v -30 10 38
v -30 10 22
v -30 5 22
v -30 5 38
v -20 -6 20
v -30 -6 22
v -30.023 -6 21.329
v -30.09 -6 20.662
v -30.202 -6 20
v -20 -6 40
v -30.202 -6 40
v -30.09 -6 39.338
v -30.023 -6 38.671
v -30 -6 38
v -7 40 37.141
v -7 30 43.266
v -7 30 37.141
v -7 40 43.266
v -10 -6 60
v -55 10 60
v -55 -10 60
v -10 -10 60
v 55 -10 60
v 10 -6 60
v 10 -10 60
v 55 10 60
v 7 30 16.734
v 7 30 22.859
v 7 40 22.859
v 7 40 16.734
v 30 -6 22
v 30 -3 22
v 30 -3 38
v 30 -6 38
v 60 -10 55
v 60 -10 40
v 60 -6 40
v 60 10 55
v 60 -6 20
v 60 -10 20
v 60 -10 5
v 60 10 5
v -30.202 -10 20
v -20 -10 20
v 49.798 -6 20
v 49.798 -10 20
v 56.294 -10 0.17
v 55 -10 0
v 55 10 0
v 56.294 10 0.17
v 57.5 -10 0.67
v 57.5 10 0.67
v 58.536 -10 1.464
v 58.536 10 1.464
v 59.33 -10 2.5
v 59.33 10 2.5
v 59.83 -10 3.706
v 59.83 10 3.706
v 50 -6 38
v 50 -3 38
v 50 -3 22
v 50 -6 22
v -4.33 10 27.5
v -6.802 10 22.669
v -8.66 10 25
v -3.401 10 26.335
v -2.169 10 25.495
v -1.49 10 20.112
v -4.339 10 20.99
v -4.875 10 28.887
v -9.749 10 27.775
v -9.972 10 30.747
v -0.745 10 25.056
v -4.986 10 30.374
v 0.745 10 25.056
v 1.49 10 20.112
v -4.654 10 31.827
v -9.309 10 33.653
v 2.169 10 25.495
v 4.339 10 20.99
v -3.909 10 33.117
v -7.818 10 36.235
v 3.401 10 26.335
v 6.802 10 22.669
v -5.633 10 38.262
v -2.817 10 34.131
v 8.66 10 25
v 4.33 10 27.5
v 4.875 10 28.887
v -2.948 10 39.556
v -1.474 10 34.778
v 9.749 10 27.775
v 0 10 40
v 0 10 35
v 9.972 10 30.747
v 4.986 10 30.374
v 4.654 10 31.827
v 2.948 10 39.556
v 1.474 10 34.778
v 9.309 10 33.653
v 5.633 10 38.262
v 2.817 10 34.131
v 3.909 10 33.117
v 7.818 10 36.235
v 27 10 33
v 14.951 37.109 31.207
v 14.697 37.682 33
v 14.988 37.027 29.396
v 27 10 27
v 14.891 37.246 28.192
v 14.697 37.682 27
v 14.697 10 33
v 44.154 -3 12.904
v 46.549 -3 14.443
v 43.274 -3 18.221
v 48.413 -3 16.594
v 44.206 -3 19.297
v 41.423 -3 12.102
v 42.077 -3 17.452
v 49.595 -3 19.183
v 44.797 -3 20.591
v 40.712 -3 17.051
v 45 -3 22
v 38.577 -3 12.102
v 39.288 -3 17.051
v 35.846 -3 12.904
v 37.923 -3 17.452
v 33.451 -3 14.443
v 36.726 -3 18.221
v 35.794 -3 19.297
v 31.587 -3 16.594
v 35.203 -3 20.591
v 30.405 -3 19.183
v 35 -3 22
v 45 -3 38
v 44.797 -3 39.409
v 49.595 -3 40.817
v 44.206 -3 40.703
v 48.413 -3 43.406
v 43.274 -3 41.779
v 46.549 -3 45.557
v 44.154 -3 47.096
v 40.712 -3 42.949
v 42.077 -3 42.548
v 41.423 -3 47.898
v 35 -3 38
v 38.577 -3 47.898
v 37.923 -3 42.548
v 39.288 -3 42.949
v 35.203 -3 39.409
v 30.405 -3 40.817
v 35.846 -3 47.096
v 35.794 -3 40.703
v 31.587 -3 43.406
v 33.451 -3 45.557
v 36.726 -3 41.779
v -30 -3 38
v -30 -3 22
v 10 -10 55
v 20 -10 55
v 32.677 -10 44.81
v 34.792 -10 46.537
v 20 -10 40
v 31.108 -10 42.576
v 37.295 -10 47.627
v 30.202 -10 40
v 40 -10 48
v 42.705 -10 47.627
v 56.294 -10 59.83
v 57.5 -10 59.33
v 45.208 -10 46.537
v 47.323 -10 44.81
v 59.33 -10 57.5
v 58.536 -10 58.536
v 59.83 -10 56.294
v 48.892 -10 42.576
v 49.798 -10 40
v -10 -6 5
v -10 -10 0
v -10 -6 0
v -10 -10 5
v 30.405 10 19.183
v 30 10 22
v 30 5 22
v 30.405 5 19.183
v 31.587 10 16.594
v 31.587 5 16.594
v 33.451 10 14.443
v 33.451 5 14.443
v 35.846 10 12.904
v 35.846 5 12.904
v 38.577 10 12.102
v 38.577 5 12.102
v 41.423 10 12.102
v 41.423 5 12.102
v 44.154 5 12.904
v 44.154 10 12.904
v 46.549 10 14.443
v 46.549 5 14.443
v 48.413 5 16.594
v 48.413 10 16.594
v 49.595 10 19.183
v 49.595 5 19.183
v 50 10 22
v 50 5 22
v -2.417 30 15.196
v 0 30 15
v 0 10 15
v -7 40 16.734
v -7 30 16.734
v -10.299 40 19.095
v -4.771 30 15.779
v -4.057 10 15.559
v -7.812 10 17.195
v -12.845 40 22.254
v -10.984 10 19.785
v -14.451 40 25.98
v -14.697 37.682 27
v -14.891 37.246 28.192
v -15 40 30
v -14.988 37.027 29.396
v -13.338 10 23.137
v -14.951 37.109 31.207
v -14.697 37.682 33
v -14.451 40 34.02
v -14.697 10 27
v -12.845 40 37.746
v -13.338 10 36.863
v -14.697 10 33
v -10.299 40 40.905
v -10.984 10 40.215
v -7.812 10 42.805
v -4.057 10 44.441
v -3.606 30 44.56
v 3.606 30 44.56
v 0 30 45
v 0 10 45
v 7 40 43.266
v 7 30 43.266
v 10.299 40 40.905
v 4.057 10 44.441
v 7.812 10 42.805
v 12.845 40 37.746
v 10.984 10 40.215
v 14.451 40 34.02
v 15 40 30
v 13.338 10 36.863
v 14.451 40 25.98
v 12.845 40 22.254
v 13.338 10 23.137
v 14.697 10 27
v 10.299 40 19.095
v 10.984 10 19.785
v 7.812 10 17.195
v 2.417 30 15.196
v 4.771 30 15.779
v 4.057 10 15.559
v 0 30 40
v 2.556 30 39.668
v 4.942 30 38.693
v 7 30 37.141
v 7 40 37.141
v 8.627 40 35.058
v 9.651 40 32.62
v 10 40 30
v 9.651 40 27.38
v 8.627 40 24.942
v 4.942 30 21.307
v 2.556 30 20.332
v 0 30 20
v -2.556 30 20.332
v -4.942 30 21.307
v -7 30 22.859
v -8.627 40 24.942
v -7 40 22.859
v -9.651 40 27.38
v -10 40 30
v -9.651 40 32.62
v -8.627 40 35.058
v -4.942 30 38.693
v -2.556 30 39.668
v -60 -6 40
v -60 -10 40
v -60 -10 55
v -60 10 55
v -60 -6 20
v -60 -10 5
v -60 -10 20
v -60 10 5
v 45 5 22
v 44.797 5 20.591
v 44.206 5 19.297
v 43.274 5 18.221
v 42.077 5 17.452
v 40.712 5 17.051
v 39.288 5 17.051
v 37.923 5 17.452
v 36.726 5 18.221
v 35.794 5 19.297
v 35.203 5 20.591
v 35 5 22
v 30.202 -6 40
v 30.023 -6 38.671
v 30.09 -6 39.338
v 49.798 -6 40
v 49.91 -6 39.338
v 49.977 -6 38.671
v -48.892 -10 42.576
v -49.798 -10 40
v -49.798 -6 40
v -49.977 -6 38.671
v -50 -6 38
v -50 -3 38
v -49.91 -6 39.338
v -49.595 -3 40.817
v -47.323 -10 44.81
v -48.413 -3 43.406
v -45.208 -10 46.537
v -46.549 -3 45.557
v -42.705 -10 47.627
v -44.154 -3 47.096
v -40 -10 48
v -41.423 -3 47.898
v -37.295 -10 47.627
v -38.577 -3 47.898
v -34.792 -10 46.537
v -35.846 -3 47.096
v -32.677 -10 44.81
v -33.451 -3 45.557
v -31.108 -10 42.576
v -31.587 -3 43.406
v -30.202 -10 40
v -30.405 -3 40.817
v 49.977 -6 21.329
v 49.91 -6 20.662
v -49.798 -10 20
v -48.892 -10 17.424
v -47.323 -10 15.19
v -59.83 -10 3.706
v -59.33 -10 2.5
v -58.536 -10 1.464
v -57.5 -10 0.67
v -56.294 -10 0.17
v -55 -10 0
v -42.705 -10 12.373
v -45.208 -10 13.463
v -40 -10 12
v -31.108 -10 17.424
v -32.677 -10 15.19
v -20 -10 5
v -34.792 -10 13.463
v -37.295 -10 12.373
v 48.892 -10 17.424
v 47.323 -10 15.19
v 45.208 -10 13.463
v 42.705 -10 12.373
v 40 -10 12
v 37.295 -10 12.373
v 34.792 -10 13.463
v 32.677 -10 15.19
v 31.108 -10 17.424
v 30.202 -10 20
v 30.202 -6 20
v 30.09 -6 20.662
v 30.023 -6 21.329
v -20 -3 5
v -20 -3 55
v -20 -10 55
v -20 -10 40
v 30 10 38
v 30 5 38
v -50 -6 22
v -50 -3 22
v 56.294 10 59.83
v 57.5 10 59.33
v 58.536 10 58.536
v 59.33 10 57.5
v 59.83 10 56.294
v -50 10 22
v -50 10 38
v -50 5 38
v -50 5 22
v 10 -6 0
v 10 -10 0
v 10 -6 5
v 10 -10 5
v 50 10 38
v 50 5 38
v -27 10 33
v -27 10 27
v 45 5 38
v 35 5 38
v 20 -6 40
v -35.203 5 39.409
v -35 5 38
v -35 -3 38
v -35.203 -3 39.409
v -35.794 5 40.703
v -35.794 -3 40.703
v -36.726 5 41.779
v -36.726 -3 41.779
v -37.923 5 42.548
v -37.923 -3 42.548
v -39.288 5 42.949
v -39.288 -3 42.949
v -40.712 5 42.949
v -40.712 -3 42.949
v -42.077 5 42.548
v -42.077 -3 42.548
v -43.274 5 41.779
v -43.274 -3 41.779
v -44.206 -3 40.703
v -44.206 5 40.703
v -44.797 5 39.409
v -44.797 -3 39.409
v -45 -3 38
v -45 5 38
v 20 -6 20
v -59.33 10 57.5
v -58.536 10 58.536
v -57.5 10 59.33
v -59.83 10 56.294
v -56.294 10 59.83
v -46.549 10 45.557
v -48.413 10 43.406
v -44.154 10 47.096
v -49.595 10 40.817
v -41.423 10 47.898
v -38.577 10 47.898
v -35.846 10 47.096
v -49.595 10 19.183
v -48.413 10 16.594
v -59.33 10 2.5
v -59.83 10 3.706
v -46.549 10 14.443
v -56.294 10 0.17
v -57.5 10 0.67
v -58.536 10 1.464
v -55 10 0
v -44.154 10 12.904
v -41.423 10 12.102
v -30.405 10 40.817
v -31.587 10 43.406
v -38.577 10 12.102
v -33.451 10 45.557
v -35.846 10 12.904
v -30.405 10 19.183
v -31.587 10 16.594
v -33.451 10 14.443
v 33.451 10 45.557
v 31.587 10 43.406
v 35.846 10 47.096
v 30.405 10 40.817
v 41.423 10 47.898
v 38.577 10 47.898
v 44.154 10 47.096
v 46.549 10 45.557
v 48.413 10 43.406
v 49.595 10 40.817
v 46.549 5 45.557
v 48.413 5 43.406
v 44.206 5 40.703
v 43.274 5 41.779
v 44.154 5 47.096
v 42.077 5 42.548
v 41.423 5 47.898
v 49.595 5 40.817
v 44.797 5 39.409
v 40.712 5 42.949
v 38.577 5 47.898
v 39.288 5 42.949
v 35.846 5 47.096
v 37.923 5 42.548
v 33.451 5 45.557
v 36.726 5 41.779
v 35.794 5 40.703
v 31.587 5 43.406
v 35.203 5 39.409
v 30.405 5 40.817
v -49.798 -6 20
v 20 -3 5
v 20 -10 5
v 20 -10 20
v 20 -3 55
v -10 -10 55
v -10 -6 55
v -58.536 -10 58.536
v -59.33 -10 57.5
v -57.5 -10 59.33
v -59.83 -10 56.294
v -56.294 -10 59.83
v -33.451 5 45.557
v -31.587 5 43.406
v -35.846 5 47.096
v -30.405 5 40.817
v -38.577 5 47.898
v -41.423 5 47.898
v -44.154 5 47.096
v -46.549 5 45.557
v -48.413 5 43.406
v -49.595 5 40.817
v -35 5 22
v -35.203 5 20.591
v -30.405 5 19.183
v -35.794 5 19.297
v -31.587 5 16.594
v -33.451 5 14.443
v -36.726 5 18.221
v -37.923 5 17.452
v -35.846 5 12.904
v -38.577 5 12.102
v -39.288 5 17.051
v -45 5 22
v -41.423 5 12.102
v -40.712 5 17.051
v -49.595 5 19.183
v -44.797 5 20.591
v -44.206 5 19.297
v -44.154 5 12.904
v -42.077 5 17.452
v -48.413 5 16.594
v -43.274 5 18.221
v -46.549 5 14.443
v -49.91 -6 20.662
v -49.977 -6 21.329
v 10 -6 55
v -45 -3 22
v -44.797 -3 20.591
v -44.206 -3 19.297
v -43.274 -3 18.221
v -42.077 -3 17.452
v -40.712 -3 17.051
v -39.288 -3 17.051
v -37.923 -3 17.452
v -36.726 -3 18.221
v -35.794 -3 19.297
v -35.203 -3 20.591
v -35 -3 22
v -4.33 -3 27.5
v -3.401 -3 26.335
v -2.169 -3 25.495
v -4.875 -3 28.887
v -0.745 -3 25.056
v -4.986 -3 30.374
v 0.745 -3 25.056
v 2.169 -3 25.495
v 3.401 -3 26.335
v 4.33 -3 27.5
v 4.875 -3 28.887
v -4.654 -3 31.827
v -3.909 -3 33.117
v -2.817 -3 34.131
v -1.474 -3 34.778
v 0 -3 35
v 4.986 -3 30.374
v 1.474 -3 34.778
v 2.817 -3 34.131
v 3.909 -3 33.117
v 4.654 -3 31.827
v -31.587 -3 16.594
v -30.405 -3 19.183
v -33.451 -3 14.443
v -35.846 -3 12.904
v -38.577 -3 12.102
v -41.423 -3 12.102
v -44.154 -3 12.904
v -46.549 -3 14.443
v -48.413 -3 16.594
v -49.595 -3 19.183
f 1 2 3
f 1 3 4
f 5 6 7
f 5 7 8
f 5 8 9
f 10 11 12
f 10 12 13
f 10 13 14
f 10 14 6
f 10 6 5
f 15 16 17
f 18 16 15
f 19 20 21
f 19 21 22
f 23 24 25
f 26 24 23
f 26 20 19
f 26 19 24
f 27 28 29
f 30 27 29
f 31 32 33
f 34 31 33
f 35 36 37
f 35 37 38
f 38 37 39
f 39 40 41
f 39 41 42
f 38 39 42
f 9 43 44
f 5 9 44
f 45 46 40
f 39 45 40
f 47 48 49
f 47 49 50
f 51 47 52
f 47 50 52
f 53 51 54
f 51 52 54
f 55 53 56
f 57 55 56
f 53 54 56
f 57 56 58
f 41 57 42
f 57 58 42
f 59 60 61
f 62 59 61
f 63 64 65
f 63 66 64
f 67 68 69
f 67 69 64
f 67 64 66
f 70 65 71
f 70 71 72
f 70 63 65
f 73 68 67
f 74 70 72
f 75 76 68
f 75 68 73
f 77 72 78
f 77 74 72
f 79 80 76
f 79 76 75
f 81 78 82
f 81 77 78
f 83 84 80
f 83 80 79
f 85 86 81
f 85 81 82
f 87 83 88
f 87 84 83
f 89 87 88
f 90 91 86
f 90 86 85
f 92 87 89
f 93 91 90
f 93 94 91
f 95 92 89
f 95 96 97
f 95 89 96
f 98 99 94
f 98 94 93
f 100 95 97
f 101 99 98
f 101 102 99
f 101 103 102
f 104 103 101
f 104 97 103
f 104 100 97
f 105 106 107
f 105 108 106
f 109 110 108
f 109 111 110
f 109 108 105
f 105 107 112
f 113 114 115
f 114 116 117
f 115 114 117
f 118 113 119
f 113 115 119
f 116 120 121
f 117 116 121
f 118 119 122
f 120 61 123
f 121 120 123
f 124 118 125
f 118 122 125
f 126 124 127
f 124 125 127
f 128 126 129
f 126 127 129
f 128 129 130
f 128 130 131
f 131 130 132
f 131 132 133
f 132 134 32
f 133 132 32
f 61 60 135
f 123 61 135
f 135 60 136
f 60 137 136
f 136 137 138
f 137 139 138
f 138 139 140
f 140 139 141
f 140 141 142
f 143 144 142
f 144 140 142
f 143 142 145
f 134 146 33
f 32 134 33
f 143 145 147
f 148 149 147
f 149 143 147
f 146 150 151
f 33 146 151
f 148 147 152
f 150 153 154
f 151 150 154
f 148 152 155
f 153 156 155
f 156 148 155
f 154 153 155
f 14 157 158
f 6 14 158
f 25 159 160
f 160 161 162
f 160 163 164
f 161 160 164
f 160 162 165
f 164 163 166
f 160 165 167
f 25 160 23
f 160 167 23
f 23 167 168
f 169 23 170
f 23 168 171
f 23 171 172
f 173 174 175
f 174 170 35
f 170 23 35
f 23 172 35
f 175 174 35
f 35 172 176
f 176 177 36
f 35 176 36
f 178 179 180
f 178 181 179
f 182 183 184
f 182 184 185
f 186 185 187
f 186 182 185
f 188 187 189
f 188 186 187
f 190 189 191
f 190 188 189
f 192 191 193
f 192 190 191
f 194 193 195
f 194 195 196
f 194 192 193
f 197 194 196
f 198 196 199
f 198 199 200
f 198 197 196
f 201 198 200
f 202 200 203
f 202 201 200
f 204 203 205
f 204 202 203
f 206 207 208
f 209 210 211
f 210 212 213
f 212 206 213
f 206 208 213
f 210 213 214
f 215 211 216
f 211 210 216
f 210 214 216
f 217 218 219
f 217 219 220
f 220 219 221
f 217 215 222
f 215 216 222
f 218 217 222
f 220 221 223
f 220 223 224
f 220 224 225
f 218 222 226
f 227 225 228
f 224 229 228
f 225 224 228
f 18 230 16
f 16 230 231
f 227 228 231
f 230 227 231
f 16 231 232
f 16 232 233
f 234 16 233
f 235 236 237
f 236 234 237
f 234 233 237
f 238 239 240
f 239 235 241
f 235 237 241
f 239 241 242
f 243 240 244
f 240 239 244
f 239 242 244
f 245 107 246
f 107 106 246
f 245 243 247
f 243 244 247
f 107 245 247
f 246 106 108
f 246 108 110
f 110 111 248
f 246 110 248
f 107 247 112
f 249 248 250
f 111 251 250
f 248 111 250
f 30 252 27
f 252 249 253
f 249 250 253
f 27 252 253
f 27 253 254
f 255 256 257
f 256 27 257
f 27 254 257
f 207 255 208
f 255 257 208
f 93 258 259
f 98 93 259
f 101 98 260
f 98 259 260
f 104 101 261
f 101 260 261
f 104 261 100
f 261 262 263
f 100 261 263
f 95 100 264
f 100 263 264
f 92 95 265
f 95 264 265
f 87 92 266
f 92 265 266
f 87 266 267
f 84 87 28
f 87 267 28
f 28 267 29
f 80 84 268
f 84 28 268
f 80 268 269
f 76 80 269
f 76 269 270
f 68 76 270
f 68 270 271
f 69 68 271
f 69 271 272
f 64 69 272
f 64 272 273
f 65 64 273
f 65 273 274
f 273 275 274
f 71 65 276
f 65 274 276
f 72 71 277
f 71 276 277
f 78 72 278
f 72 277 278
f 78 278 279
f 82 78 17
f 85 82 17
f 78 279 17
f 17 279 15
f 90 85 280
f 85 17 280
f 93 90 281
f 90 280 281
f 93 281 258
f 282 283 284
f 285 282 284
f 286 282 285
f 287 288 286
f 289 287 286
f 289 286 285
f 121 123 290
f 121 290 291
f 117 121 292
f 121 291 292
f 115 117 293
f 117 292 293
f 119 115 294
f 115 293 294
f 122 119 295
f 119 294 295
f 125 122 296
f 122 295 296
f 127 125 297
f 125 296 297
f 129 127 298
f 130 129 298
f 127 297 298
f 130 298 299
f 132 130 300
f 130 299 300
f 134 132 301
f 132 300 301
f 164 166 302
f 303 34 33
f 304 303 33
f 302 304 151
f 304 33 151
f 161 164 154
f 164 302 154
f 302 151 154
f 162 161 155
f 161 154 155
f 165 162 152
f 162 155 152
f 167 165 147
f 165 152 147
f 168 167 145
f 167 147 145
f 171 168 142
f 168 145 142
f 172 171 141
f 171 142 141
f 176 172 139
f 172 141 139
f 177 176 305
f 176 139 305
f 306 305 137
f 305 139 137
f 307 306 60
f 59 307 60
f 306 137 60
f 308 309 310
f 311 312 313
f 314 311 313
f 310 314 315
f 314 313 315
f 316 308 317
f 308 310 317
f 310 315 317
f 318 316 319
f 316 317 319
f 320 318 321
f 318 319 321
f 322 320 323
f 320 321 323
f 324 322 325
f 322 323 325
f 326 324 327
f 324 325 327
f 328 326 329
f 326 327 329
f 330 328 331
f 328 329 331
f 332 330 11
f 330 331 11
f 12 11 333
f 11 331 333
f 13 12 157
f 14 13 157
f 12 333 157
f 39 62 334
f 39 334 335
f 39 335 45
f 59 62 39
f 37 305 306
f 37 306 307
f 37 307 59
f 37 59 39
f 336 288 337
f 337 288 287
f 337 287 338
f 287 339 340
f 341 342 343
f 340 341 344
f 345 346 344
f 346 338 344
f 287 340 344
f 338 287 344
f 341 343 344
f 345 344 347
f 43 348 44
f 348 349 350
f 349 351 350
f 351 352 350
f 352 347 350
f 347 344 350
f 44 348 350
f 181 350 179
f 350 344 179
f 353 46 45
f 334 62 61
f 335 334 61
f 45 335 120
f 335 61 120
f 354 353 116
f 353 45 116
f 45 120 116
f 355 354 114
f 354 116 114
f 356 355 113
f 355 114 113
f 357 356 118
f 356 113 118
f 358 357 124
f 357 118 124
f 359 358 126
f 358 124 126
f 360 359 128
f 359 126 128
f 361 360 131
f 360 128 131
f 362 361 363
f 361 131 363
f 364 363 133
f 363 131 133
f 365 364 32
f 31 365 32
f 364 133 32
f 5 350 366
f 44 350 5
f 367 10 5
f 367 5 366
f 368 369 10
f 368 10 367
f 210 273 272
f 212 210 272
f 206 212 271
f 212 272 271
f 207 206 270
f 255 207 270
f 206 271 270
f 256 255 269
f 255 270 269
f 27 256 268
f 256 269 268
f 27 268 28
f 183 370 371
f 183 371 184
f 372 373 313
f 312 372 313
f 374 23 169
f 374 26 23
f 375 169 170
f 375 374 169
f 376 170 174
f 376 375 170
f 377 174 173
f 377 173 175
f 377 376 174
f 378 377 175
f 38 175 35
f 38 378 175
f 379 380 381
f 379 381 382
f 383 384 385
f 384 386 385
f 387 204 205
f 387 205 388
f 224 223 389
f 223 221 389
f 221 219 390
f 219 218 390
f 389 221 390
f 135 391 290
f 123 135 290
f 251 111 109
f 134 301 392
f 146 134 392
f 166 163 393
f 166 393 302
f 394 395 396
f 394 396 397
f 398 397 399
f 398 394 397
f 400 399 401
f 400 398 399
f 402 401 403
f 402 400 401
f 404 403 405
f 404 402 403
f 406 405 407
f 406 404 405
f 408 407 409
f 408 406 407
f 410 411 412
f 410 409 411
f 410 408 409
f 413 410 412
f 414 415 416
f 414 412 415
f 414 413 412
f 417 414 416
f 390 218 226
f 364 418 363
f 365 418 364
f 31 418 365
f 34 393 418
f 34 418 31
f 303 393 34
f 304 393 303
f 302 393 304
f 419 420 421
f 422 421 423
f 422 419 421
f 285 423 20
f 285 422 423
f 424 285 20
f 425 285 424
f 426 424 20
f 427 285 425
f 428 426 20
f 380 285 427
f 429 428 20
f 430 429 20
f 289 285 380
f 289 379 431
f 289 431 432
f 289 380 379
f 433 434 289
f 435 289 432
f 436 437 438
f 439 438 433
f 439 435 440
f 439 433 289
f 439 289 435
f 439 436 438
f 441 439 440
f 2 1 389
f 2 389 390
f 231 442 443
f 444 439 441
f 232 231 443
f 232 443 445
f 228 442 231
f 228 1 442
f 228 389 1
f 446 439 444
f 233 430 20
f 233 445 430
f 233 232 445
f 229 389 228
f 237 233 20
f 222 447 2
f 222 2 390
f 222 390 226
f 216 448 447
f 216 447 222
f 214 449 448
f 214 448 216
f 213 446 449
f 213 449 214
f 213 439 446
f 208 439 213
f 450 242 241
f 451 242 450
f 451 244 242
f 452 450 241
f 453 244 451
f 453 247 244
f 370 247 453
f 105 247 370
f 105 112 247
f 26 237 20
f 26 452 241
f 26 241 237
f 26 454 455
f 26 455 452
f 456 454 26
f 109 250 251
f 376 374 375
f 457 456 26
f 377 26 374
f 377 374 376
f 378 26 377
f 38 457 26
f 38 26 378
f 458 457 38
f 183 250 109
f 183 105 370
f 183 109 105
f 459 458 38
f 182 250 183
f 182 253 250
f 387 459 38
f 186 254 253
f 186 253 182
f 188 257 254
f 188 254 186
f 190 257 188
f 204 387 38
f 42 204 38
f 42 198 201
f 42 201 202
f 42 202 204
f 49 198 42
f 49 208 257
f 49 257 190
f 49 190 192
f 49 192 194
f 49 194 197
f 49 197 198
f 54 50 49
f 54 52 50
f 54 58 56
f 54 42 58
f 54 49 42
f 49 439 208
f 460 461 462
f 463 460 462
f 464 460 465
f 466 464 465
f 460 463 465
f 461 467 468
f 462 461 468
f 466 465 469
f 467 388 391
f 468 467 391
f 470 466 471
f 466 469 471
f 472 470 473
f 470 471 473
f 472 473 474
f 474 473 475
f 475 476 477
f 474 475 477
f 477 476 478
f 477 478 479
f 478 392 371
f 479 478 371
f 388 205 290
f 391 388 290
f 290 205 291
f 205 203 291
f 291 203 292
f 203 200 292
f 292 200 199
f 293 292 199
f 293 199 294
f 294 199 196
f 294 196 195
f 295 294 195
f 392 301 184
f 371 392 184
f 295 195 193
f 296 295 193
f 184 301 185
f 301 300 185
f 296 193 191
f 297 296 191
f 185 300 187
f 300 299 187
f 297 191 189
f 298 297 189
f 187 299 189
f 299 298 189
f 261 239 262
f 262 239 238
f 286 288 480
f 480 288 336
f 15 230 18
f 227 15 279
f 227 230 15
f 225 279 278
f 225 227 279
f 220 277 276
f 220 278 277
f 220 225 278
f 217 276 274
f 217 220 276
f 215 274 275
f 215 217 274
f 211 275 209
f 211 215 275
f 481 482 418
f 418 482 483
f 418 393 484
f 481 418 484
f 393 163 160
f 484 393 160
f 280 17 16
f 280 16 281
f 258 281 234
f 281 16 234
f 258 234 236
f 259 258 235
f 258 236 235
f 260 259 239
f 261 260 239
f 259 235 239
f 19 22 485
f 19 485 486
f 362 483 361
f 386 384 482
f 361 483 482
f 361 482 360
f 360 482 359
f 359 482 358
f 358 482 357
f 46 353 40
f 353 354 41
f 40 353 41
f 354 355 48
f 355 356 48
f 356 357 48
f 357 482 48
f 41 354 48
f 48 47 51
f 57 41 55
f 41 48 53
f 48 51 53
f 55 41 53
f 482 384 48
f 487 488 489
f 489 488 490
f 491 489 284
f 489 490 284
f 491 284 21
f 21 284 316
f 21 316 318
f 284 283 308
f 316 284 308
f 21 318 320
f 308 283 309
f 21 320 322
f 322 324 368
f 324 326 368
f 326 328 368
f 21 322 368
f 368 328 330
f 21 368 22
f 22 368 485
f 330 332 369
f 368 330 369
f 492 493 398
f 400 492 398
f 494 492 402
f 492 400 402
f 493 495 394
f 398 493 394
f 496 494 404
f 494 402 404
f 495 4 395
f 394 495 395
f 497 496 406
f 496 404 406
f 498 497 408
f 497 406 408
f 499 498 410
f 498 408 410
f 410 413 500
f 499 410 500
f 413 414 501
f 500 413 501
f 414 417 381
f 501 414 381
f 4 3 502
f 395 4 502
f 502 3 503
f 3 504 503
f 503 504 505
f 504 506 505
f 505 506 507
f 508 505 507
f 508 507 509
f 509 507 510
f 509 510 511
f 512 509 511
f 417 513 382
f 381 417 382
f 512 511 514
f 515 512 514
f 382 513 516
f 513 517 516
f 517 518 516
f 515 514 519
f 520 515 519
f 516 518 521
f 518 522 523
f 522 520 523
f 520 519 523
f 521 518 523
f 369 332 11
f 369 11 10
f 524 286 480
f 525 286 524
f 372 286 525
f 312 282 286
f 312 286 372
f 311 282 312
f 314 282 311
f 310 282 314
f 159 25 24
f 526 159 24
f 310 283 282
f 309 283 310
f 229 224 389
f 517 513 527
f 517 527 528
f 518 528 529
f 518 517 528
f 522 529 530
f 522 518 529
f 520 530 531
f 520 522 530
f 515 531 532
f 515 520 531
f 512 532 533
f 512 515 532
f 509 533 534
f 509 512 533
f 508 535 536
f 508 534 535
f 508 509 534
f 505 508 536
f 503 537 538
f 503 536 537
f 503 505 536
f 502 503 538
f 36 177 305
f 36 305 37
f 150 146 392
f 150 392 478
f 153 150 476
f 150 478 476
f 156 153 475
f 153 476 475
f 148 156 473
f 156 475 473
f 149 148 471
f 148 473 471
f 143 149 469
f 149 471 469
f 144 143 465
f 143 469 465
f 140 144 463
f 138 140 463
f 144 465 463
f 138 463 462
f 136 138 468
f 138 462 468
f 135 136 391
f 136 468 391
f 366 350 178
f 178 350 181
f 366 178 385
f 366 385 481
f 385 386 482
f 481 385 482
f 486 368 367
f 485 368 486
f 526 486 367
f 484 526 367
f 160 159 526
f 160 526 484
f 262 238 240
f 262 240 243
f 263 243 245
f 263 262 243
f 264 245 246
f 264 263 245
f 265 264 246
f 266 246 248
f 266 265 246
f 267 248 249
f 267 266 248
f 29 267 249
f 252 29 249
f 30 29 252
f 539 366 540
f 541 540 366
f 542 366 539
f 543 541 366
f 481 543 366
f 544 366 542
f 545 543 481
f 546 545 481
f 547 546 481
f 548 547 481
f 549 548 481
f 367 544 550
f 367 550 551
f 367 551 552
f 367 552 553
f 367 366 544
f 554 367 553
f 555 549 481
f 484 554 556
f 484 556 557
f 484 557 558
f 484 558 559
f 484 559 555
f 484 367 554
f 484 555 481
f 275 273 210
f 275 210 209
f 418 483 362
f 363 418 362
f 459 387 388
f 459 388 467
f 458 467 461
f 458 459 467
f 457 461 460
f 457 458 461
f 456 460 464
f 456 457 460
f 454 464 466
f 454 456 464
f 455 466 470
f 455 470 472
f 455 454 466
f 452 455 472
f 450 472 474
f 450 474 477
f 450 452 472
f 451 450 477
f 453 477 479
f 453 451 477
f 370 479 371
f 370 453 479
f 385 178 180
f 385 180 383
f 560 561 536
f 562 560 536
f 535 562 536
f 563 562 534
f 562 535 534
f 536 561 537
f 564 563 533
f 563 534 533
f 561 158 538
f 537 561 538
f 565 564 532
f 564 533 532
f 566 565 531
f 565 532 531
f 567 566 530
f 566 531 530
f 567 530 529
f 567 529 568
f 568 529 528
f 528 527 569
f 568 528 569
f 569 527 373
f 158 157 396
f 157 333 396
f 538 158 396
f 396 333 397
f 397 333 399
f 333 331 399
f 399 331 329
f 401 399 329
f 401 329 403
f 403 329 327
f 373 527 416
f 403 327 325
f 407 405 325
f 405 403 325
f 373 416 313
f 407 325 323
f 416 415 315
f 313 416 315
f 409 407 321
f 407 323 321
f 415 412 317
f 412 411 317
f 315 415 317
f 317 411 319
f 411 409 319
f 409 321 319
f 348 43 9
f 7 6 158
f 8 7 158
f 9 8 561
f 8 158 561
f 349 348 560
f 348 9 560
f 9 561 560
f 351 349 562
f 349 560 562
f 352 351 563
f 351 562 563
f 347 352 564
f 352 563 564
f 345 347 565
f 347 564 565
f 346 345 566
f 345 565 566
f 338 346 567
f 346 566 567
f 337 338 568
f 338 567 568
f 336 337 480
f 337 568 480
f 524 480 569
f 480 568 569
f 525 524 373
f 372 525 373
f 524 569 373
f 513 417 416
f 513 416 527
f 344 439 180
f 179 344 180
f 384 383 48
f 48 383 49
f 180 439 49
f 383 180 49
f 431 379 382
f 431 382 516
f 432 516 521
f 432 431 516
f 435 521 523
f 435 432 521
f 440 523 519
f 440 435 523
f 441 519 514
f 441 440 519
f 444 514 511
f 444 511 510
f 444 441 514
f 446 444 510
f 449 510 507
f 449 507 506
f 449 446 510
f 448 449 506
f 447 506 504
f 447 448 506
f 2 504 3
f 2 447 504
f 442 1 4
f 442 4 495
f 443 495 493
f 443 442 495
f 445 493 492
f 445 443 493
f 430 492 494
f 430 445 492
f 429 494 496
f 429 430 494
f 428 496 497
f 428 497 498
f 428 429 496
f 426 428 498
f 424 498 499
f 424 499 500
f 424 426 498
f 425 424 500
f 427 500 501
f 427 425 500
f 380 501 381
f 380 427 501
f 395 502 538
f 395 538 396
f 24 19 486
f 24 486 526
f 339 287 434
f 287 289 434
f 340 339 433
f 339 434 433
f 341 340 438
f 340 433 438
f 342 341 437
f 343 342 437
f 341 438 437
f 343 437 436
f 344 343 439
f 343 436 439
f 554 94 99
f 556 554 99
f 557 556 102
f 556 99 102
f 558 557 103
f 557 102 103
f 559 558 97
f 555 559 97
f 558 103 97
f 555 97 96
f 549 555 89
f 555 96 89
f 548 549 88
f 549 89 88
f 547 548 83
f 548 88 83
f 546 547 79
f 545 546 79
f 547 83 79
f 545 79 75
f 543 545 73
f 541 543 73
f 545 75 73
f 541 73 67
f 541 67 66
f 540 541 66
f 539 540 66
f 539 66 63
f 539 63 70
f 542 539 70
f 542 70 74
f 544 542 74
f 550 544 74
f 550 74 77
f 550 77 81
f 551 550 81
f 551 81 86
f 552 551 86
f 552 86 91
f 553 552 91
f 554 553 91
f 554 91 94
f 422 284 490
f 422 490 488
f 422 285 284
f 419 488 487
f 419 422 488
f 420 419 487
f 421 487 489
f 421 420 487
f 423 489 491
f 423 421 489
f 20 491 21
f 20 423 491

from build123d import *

# Parameters (mm, degrees)
SKETCH1_W           = 120
SKETCH1_H           = 20
BOSS_EXTRUDE1_DEPTH = 60
SKETCH2_R           = 15
BOSS_EXTRUDE2_DEPTH = 30
SKETCH3_R           = 5
CUT_EXTRUDE1_DEPTH  = 76
SKETCH4_R           = 10
CUT_EXTRUDE3_DEPTH  = 30
SKETCH5_W           = 40
SKETCH5_H           = 50
CUT_EXTRUDE5_DEPTH  = 7
SKETCH6_W           = 20
SKETCH6_H           = 8
CUT_EXTRUDE6_DEPTH  = 70
CUT_EXTRUDE7_DEPTH  = 5
CUT_EXTRUDE8_START  = -7
CUT_EXTRUDE8_DEPTH  = 7
CUT_EXTRUDE9_DEPTH  = 24
SKETCH11_W          = 120
SKETCH11_H          = 20
CUT_EXTRUDE10_DEPTH = 4
RIB10_REACH         = 80.102
SKETCH12_WALL_W     = 187.751566924
SKETCH12_WALL_H     = 6
RIB11_REACH         = 80.102
SKETCH13_WALL_W     = 187.751566924
SKETCH13_WALL_H     = 6
FILLET1_R           = 5
SKETCH14_W          = 14
SKETCH14_H          = 10
CUT_EXTRUDE13_DEPTH = 20


with BuildPart() as part:
    # Sketch1 → Boss-Extrude1 (new body)
    with BuildSketch(Plane.XY):
        Rectangle(SKETCH1_W, SKETCH1_H)
    extrude(amount=BOSS_EXTRUDE1_DEPTH)

    # Sketch2 → Boss-Extrude2 (add)
    with BuildSketch(Plane(origin=(0, 10, 0), x_dir=(1, 0, 0), z_dir=(0, 1, 0))):
        with Locations(Location((0, -30, 0), (0, 0, 90))):
            Circle(SKETCH2_R)
    extrude(amount=BOSS_EXTRUDE2_DEPTH)

    # Sketch3 → Cut-Extrude1 (cut)
    with BuildSketch(Plane(origin=(0, 40, 0), x_dir=(1, 0, 0), z_dir=(0, 1, 0))):
        with Locations(Location((0, -30, 0), (0, 0, 270))):
            Circle(SKETCH3_R)
    extrude(amount=-CUT_EXTRUDE1_DEPTH, mode=Mode.SUBTRACT)

    # Sketch4 → Cut-Extrude3 (cut)
    with BuildSketch(Plane(origin=(0, 40, 0), x_dir=(1, 0, 0), z_dir=(0, 1, 0))):
        with Locations(Location((0, -30, 0), (0, 0, 270))):
            Circle(SKETCH4_R)
    extrude(amount=-CUT_EXTRUDE3_DEPTH, mode=Mode.SUBTRACT)

    # Sketch5 → Cut-Extrude5 (cut)
    with BuildSketch(Plane.XZ.offset(10)):
        with Locations((0, 30)):
            Rectangle(SKETCH5_W, SKETCH5_H)
    extrude(amount=-CUT_EXTRUDE5_DEPTH, mode=Mode.SUBTRACT)

    # Sketch6 → Cut-Extrude6 (cut)
    with BuildSketch(Plane.XY.offset(60)):
        with Locations((0, -10)):
            Rectangle(SKETCH6_W, SKETCH6_H)
    extrude(amount=-CUT_EXTRUDE6_DEPTH, mode=Mode.SUBTRACT)

    # Sketch7 → Cut-Extrude7 (cut)
    with BuildSketch(Plane(origin=(0, 10, 0), x_dir=(1, 0, 0), z_dir=(0, 1, 0))):
        with BuildLine():
            Line((-30, -22), (-30, -38))
            ThreePointArc((-30, -38), (-40, -48), (-50, -38))
            Line((-50, -38), (-50, -22))
            ThreePointArc((-50, -22), (-40, -12), (-30, -22))
        make_face()
        with BuildLine():
            Line((50, -22), (50, -38))
            ThreePointArc((50, -38), (40, -48), (30, -38))
            Line((30, -38), (30, -22))
            ThreePointArc((30, -22), (40, -12), (50, -22))
        make_face()
    extrude(amount=-CUT_EXTRUDE7_DEPTH, mode=Mode.SUBTRACT)

    # Sketch9 → Cut-Extrude8 (cut)
    with BuildSketch(Plane.XZ.offset(10).offset(CUT_EXTRUDE8_START)):
        with BuildLine():
            Line((-30, 38), (-30, 22))
            ThreePointArc((-30, 22), (-40, 12), (-50, 22))
            Line((-50, 22), (-50, 38))
            ThreePointArc((-50, 38), (-40, 48), (-30, 38))
        make_face()
        with BuildLine():
            Line((50, 38), (50, 22))
            ThreePointArc((50, 22), (40, 12), (30, 22))
            Line((30, 22), (30, 38))
            ThreePointArc((30, 38), (40, 48), (50, 38))
        make_face()
    extrude(amount=CUT_EXTRUDE8_DEPTH, mode=Mode.SUBTRACT)

    # Sketch10 → Cut-Extrude9 (cut)
    with BuildSketch(Plane(origin=(0, 5, 0), x_dir=(1, 0, 0), z_dir=(0, 1, 0))):
        with BuildLine():
            Line((-45, -38), (-45, -22))
            ThreePointArc((-45, -22), (-40, -17), (-35, -22))
            Line((-35, -22), (-35, -38))
            ThreePointArc((-35, -38), (-40, -43), (-45, -38))
        make_face()
        with BuildLine():
            Line((45, -38), (45, -22))
            ThreePointArc((45, -22), (40, -17), (35, -22))
            Line((35, -22), (35, -38))
            ThreePointArc((35, -38), (40, -43), (45, -38))
        make_face()
    extrude(amount=-CUT_EXTRUDE9_DEPTH, mode=Mode.SUBTRACT)

    # Sketch11 → Cut-Extrude10 (cut)
    with BuildSketch(Plane.XZ.offset(10)):
        with Locations((0, 30)):
            Rectangle(SKETCH11_W, SKETCH11_H)
    extrude(amount=-CUT_EXTRUDE10_DEPTH, mode=Mode.SUBTRACT)

    # Sketch12 wall → Rib10 (add, up to next)
    with BuildSketch(Plane(origin=(-21, 23.5, 30), x_dir=(-0.406138466053, -0.91381154862, 0), z_dir=(0.91381154862, -0.406138466053, 0)), mode=Mode.PRIVATE) as rib10_sk1:
        Rectangle(SKETCH12_WALL_W, SKETCH12_WALL_H)
    rib10_tool1 = extrude(rib10_sk1.sketch, amount=RIB10_REACH, mode=Mode.PRIVATE) - part.part
    add(rib10_tool1.solids().sort_by_distance((-21, 23.5, 30))[0])

    # Sketch13 wall → Rib11 (add, up to next)
    with BuildSketch(Plane(origin=(21, 23.5, 30), x_dir=(0.406138466053, -0.91381154862, 0), z_dir=(0.91381154862, 0.406138466053, 0)), mode=Mode.PRIVATE) as rib11_sk1:
        Rectangle(SKETCH13_WALL_W, SKETCH13_WALL_H)
    rib11_tool1 = extrude(rib11_sk1.sketch, amount=-RIB11_REACH, mode=Mode.PRIVATE) - part.part
    add(rib11_tool1.solids().sort_by_distance((21, 23.5, 30))[0])

    # Fillet1
    fillet1_edges = [part.edges().sort_by_distance(p)[0] for p in [
        (-60, 0, 60),
        (60, 0, 60),
        (-60, 0, 0),
        (60, 0, 0),
    ]]
    fillet(fillet1_edges, radius=FILLET1_R)

    # Sketch14 → Cut-Extrude13 (cut, symmetric)
    with BuildSketch(Plane.XY.offset(30)):
        with Locations((0, 35)):
            Rectangle(SKETCH14_W, SKETCH14_H)
    extrude(amount=CUT_EXTRUDE13_DEPTH, both=True, mode=Mode.SUBTRACT)


solid = part.part
